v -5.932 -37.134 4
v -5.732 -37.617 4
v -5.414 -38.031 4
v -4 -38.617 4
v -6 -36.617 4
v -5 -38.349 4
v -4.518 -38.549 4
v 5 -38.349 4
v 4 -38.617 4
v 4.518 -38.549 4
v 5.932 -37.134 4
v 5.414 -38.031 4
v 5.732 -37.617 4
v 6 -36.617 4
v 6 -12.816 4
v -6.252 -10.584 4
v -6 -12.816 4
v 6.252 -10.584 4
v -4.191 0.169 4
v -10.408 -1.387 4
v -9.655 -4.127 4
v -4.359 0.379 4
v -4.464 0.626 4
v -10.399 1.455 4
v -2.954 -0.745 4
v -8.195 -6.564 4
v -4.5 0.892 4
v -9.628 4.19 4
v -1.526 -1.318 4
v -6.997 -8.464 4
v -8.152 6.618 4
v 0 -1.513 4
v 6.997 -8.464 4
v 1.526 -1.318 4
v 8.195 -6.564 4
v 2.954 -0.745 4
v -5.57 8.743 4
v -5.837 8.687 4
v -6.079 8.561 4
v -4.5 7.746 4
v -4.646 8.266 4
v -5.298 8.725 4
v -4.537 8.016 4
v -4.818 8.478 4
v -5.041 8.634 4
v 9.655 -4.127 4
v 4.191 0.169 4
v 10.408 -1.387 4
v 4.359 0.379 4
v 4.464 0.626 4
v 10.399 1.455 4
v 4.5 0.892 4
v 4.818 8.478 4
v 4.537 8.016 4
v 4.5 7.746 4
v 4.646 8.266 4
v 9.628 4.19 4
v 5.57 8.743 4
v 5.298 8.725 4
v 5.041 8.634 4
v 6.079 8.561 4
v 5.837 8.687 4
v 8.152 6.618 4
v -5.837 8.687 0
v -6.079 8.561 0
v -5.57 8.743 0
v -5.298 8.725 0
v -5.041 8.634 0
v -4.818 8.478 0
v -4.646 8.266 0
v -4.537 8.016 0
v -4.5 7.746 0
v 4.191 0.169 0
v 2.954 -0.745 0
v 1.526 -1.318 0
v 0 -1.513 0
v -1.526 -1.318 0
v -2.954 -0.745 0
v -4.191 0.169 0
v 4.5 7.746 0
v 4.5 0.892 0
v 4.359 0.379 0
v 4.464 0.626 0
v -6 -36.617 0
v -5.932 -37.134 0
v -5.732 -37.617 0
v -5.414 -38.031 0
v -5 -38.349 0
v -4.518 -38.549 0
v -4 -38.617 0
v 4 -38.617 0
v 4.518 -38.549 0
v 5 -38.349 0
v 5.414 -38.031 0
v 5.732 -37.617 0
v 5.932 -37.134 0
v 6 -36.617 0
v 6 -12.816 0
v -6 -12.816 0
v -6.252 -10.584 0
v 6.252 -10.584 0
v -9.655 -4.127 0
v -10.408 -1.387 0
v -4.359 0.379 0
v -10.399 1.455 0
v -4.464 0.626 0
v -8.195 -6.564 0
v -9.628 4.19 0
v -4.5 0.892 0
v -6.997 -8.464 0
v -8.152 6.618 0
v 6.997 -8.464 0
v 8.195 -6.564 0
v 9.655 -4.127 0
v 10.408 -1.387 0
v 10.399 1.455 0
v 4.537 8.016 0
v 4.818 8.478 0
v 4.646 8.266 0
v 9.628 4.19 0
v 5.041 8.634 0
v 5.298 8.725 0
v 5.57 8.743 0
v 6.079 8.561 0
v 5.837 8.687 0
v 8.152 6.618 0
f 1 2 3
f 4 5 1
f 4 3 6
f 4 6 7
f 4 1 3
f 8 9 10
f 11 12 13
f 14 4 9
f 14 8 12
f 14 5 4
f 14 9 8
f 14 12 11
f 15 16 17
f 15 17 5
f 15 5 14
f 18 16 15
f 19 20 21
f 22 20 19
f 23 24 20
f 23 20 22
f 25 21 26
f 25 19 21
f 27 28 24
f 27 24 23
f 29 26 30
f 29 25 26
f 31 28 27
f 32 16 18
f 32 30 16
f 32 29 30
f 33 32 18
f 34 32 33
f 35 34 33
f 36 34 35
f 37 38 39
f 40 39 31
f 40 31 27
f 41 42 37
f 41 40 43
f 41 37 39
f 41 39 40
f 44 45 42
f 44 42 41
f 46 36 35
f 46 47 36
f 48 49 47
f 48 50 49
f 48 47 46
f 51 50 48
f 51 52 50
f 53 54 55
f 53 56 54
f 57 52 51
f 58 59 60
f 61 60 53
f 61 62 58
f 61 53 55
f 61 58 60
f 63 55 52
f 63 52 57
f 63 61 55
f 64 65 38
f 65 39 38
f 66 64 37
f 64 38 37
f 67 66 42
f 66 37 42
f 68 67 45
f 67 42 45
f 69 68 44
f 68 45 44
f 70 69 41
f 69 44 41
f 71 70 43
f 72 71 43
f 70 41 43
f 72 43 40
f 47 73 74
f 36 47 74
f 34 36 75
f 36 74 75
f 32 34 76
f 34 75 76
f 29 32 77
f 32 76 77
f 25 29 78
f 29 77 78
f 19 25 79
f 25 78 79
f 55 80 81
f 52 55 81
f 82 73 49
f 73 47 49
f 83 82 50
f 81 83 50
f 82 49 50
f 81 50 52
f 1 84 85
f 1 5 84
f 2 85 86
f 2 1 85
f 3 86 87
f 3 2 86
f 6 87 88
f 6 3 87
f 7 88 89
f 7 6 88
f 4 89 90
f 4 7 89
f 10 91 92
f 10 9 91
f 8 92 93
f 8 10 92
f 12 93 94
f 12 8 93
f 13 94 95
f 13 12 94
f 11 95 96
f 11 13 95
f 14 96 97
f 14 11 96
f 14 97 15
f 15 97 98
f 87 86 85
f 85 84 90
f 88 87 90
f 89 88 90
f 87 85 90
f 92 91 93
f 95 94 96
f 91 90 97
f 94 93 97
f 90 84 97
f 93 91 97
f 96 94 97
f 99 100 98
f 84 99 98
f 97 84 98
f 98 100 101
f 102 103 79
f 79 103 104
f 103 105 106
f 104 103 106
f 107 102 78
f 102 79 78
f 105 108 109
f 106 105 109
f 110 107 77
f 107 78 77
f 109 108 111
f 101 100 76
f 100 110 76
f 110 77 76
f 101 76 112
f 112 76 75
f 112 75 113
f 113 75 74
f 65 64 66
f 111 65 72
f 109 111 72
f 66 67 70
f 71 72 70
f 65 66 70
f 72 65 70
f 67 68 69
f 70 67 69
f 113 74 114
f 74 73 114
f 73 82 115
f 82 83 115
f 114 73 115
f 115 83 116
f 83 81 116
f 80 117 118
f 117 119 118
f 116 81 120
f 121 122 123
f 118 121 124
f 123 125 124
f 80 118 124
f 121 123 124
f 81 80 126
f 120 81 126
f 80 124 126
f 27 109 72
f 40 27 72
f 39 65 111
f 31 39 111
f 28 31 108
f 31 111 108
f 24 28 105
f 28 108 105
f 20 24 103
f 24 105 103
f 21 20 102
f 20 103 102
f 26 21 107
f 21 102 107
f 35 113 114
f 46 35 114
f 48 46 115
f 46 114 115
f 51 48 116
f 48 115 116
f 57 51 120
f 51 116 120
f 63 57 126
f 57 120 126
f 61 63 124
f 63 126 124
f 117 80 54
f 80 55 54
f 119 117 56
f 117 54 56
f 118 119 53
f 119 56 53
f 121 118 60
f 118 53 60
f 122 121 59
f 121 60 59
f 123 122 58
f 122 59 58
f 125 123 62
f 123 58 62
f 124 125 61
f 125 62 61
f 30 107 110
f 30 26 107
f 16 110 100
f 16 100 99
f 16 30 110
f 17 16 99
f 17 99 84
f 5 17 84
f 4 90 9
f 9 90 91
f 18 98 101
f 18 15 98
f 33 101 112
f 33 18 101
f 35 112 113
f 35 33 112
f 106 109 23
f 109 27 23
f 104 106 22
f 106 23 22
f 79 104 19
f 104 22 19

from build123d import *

# Parameters (mm, degrees)
F1_DEPTH = 4
F2_R     = 10
F3_R     = 1
F4_R     = 2
F5_R     = 1


with BuildPart() as f1:
    # F0 (on Top) → F1 (new body)
    with BuildSketch(Plane.XY):
        with BuildLine():
            Line((-4.5, 0.4868329805), (-4.5, 9.4868329805))
            ThreePointArc((-4.5, 9.4868329805), (-10.4641425726, 0.8670180042), (-6, -8.6168439698))
            Line((-6, -8.6168439698), (6, -8.6168439698))
            ThreePointArc((6, -8.6168439698), (10.4641425726, 0.8670180042), (4.5, 9.4868329805))
            Line((4.5, 9.4868329805), (4.5, 0.4868329805))
            ThreePointArc((4.5, 0.4868329805), (0, -1.5131670195), (-4.5, 0.4868329805))
        make_face()
        with BuildLine():
            Line((6, -8.6168439698), (-6, -8.6168439698))
            ThreePointArc((-6, -8.6168439698), (0, -10.5), (6, -8.6168439698))
        make_face()
        with BuildLine():
            ThreePointArc((6, -8.6168439698), (0, -10.5), (-6, -8.6168439698))
            Line((-6, -8.6168439698), (-6, -38.6168439698))
            Line((-6, -38.6168439698), (6, -38.6168439698))
            Line((6, -38.6168439698), (6, -8.6168439698))
        make_face()
    extrude(amount=F1_DEPTH)

    # F2
    f2_edges = [f1.edges().sort_by_distance(p)[0] for p in [
        (-6, -8.616844, 2),
        (6, -8.616844, 2),
    ]]
    fillet(f2_edges, radius=F2_R)

    # F3
    f3_edges = [f1.edges().sort_by_distance(p)[0] for p in [
        (-4.5, 9.486833, 2),
        (4.5, 9.486833, 2),
    ]]
    fillet(f3_edges, radius=F3_R)

    # F4
    f4_edges = [f1.edges().sort_by_distance(p)[0] for p in [
        (6, -38.616844, 2),
        (-6, -38.616844, 2),
    ]]
    fillet(f4_edges, radius=F4_R)

    # F5
    f5_edges = [f1.edges().sort_by_distance(p)[0] for p in [
        (4.5, 0.486833, 2),
        (-4.5, 0.486833, 2),
    ]]
    fillet(f5_edges, radius=F5_R)


solid = f1.part
